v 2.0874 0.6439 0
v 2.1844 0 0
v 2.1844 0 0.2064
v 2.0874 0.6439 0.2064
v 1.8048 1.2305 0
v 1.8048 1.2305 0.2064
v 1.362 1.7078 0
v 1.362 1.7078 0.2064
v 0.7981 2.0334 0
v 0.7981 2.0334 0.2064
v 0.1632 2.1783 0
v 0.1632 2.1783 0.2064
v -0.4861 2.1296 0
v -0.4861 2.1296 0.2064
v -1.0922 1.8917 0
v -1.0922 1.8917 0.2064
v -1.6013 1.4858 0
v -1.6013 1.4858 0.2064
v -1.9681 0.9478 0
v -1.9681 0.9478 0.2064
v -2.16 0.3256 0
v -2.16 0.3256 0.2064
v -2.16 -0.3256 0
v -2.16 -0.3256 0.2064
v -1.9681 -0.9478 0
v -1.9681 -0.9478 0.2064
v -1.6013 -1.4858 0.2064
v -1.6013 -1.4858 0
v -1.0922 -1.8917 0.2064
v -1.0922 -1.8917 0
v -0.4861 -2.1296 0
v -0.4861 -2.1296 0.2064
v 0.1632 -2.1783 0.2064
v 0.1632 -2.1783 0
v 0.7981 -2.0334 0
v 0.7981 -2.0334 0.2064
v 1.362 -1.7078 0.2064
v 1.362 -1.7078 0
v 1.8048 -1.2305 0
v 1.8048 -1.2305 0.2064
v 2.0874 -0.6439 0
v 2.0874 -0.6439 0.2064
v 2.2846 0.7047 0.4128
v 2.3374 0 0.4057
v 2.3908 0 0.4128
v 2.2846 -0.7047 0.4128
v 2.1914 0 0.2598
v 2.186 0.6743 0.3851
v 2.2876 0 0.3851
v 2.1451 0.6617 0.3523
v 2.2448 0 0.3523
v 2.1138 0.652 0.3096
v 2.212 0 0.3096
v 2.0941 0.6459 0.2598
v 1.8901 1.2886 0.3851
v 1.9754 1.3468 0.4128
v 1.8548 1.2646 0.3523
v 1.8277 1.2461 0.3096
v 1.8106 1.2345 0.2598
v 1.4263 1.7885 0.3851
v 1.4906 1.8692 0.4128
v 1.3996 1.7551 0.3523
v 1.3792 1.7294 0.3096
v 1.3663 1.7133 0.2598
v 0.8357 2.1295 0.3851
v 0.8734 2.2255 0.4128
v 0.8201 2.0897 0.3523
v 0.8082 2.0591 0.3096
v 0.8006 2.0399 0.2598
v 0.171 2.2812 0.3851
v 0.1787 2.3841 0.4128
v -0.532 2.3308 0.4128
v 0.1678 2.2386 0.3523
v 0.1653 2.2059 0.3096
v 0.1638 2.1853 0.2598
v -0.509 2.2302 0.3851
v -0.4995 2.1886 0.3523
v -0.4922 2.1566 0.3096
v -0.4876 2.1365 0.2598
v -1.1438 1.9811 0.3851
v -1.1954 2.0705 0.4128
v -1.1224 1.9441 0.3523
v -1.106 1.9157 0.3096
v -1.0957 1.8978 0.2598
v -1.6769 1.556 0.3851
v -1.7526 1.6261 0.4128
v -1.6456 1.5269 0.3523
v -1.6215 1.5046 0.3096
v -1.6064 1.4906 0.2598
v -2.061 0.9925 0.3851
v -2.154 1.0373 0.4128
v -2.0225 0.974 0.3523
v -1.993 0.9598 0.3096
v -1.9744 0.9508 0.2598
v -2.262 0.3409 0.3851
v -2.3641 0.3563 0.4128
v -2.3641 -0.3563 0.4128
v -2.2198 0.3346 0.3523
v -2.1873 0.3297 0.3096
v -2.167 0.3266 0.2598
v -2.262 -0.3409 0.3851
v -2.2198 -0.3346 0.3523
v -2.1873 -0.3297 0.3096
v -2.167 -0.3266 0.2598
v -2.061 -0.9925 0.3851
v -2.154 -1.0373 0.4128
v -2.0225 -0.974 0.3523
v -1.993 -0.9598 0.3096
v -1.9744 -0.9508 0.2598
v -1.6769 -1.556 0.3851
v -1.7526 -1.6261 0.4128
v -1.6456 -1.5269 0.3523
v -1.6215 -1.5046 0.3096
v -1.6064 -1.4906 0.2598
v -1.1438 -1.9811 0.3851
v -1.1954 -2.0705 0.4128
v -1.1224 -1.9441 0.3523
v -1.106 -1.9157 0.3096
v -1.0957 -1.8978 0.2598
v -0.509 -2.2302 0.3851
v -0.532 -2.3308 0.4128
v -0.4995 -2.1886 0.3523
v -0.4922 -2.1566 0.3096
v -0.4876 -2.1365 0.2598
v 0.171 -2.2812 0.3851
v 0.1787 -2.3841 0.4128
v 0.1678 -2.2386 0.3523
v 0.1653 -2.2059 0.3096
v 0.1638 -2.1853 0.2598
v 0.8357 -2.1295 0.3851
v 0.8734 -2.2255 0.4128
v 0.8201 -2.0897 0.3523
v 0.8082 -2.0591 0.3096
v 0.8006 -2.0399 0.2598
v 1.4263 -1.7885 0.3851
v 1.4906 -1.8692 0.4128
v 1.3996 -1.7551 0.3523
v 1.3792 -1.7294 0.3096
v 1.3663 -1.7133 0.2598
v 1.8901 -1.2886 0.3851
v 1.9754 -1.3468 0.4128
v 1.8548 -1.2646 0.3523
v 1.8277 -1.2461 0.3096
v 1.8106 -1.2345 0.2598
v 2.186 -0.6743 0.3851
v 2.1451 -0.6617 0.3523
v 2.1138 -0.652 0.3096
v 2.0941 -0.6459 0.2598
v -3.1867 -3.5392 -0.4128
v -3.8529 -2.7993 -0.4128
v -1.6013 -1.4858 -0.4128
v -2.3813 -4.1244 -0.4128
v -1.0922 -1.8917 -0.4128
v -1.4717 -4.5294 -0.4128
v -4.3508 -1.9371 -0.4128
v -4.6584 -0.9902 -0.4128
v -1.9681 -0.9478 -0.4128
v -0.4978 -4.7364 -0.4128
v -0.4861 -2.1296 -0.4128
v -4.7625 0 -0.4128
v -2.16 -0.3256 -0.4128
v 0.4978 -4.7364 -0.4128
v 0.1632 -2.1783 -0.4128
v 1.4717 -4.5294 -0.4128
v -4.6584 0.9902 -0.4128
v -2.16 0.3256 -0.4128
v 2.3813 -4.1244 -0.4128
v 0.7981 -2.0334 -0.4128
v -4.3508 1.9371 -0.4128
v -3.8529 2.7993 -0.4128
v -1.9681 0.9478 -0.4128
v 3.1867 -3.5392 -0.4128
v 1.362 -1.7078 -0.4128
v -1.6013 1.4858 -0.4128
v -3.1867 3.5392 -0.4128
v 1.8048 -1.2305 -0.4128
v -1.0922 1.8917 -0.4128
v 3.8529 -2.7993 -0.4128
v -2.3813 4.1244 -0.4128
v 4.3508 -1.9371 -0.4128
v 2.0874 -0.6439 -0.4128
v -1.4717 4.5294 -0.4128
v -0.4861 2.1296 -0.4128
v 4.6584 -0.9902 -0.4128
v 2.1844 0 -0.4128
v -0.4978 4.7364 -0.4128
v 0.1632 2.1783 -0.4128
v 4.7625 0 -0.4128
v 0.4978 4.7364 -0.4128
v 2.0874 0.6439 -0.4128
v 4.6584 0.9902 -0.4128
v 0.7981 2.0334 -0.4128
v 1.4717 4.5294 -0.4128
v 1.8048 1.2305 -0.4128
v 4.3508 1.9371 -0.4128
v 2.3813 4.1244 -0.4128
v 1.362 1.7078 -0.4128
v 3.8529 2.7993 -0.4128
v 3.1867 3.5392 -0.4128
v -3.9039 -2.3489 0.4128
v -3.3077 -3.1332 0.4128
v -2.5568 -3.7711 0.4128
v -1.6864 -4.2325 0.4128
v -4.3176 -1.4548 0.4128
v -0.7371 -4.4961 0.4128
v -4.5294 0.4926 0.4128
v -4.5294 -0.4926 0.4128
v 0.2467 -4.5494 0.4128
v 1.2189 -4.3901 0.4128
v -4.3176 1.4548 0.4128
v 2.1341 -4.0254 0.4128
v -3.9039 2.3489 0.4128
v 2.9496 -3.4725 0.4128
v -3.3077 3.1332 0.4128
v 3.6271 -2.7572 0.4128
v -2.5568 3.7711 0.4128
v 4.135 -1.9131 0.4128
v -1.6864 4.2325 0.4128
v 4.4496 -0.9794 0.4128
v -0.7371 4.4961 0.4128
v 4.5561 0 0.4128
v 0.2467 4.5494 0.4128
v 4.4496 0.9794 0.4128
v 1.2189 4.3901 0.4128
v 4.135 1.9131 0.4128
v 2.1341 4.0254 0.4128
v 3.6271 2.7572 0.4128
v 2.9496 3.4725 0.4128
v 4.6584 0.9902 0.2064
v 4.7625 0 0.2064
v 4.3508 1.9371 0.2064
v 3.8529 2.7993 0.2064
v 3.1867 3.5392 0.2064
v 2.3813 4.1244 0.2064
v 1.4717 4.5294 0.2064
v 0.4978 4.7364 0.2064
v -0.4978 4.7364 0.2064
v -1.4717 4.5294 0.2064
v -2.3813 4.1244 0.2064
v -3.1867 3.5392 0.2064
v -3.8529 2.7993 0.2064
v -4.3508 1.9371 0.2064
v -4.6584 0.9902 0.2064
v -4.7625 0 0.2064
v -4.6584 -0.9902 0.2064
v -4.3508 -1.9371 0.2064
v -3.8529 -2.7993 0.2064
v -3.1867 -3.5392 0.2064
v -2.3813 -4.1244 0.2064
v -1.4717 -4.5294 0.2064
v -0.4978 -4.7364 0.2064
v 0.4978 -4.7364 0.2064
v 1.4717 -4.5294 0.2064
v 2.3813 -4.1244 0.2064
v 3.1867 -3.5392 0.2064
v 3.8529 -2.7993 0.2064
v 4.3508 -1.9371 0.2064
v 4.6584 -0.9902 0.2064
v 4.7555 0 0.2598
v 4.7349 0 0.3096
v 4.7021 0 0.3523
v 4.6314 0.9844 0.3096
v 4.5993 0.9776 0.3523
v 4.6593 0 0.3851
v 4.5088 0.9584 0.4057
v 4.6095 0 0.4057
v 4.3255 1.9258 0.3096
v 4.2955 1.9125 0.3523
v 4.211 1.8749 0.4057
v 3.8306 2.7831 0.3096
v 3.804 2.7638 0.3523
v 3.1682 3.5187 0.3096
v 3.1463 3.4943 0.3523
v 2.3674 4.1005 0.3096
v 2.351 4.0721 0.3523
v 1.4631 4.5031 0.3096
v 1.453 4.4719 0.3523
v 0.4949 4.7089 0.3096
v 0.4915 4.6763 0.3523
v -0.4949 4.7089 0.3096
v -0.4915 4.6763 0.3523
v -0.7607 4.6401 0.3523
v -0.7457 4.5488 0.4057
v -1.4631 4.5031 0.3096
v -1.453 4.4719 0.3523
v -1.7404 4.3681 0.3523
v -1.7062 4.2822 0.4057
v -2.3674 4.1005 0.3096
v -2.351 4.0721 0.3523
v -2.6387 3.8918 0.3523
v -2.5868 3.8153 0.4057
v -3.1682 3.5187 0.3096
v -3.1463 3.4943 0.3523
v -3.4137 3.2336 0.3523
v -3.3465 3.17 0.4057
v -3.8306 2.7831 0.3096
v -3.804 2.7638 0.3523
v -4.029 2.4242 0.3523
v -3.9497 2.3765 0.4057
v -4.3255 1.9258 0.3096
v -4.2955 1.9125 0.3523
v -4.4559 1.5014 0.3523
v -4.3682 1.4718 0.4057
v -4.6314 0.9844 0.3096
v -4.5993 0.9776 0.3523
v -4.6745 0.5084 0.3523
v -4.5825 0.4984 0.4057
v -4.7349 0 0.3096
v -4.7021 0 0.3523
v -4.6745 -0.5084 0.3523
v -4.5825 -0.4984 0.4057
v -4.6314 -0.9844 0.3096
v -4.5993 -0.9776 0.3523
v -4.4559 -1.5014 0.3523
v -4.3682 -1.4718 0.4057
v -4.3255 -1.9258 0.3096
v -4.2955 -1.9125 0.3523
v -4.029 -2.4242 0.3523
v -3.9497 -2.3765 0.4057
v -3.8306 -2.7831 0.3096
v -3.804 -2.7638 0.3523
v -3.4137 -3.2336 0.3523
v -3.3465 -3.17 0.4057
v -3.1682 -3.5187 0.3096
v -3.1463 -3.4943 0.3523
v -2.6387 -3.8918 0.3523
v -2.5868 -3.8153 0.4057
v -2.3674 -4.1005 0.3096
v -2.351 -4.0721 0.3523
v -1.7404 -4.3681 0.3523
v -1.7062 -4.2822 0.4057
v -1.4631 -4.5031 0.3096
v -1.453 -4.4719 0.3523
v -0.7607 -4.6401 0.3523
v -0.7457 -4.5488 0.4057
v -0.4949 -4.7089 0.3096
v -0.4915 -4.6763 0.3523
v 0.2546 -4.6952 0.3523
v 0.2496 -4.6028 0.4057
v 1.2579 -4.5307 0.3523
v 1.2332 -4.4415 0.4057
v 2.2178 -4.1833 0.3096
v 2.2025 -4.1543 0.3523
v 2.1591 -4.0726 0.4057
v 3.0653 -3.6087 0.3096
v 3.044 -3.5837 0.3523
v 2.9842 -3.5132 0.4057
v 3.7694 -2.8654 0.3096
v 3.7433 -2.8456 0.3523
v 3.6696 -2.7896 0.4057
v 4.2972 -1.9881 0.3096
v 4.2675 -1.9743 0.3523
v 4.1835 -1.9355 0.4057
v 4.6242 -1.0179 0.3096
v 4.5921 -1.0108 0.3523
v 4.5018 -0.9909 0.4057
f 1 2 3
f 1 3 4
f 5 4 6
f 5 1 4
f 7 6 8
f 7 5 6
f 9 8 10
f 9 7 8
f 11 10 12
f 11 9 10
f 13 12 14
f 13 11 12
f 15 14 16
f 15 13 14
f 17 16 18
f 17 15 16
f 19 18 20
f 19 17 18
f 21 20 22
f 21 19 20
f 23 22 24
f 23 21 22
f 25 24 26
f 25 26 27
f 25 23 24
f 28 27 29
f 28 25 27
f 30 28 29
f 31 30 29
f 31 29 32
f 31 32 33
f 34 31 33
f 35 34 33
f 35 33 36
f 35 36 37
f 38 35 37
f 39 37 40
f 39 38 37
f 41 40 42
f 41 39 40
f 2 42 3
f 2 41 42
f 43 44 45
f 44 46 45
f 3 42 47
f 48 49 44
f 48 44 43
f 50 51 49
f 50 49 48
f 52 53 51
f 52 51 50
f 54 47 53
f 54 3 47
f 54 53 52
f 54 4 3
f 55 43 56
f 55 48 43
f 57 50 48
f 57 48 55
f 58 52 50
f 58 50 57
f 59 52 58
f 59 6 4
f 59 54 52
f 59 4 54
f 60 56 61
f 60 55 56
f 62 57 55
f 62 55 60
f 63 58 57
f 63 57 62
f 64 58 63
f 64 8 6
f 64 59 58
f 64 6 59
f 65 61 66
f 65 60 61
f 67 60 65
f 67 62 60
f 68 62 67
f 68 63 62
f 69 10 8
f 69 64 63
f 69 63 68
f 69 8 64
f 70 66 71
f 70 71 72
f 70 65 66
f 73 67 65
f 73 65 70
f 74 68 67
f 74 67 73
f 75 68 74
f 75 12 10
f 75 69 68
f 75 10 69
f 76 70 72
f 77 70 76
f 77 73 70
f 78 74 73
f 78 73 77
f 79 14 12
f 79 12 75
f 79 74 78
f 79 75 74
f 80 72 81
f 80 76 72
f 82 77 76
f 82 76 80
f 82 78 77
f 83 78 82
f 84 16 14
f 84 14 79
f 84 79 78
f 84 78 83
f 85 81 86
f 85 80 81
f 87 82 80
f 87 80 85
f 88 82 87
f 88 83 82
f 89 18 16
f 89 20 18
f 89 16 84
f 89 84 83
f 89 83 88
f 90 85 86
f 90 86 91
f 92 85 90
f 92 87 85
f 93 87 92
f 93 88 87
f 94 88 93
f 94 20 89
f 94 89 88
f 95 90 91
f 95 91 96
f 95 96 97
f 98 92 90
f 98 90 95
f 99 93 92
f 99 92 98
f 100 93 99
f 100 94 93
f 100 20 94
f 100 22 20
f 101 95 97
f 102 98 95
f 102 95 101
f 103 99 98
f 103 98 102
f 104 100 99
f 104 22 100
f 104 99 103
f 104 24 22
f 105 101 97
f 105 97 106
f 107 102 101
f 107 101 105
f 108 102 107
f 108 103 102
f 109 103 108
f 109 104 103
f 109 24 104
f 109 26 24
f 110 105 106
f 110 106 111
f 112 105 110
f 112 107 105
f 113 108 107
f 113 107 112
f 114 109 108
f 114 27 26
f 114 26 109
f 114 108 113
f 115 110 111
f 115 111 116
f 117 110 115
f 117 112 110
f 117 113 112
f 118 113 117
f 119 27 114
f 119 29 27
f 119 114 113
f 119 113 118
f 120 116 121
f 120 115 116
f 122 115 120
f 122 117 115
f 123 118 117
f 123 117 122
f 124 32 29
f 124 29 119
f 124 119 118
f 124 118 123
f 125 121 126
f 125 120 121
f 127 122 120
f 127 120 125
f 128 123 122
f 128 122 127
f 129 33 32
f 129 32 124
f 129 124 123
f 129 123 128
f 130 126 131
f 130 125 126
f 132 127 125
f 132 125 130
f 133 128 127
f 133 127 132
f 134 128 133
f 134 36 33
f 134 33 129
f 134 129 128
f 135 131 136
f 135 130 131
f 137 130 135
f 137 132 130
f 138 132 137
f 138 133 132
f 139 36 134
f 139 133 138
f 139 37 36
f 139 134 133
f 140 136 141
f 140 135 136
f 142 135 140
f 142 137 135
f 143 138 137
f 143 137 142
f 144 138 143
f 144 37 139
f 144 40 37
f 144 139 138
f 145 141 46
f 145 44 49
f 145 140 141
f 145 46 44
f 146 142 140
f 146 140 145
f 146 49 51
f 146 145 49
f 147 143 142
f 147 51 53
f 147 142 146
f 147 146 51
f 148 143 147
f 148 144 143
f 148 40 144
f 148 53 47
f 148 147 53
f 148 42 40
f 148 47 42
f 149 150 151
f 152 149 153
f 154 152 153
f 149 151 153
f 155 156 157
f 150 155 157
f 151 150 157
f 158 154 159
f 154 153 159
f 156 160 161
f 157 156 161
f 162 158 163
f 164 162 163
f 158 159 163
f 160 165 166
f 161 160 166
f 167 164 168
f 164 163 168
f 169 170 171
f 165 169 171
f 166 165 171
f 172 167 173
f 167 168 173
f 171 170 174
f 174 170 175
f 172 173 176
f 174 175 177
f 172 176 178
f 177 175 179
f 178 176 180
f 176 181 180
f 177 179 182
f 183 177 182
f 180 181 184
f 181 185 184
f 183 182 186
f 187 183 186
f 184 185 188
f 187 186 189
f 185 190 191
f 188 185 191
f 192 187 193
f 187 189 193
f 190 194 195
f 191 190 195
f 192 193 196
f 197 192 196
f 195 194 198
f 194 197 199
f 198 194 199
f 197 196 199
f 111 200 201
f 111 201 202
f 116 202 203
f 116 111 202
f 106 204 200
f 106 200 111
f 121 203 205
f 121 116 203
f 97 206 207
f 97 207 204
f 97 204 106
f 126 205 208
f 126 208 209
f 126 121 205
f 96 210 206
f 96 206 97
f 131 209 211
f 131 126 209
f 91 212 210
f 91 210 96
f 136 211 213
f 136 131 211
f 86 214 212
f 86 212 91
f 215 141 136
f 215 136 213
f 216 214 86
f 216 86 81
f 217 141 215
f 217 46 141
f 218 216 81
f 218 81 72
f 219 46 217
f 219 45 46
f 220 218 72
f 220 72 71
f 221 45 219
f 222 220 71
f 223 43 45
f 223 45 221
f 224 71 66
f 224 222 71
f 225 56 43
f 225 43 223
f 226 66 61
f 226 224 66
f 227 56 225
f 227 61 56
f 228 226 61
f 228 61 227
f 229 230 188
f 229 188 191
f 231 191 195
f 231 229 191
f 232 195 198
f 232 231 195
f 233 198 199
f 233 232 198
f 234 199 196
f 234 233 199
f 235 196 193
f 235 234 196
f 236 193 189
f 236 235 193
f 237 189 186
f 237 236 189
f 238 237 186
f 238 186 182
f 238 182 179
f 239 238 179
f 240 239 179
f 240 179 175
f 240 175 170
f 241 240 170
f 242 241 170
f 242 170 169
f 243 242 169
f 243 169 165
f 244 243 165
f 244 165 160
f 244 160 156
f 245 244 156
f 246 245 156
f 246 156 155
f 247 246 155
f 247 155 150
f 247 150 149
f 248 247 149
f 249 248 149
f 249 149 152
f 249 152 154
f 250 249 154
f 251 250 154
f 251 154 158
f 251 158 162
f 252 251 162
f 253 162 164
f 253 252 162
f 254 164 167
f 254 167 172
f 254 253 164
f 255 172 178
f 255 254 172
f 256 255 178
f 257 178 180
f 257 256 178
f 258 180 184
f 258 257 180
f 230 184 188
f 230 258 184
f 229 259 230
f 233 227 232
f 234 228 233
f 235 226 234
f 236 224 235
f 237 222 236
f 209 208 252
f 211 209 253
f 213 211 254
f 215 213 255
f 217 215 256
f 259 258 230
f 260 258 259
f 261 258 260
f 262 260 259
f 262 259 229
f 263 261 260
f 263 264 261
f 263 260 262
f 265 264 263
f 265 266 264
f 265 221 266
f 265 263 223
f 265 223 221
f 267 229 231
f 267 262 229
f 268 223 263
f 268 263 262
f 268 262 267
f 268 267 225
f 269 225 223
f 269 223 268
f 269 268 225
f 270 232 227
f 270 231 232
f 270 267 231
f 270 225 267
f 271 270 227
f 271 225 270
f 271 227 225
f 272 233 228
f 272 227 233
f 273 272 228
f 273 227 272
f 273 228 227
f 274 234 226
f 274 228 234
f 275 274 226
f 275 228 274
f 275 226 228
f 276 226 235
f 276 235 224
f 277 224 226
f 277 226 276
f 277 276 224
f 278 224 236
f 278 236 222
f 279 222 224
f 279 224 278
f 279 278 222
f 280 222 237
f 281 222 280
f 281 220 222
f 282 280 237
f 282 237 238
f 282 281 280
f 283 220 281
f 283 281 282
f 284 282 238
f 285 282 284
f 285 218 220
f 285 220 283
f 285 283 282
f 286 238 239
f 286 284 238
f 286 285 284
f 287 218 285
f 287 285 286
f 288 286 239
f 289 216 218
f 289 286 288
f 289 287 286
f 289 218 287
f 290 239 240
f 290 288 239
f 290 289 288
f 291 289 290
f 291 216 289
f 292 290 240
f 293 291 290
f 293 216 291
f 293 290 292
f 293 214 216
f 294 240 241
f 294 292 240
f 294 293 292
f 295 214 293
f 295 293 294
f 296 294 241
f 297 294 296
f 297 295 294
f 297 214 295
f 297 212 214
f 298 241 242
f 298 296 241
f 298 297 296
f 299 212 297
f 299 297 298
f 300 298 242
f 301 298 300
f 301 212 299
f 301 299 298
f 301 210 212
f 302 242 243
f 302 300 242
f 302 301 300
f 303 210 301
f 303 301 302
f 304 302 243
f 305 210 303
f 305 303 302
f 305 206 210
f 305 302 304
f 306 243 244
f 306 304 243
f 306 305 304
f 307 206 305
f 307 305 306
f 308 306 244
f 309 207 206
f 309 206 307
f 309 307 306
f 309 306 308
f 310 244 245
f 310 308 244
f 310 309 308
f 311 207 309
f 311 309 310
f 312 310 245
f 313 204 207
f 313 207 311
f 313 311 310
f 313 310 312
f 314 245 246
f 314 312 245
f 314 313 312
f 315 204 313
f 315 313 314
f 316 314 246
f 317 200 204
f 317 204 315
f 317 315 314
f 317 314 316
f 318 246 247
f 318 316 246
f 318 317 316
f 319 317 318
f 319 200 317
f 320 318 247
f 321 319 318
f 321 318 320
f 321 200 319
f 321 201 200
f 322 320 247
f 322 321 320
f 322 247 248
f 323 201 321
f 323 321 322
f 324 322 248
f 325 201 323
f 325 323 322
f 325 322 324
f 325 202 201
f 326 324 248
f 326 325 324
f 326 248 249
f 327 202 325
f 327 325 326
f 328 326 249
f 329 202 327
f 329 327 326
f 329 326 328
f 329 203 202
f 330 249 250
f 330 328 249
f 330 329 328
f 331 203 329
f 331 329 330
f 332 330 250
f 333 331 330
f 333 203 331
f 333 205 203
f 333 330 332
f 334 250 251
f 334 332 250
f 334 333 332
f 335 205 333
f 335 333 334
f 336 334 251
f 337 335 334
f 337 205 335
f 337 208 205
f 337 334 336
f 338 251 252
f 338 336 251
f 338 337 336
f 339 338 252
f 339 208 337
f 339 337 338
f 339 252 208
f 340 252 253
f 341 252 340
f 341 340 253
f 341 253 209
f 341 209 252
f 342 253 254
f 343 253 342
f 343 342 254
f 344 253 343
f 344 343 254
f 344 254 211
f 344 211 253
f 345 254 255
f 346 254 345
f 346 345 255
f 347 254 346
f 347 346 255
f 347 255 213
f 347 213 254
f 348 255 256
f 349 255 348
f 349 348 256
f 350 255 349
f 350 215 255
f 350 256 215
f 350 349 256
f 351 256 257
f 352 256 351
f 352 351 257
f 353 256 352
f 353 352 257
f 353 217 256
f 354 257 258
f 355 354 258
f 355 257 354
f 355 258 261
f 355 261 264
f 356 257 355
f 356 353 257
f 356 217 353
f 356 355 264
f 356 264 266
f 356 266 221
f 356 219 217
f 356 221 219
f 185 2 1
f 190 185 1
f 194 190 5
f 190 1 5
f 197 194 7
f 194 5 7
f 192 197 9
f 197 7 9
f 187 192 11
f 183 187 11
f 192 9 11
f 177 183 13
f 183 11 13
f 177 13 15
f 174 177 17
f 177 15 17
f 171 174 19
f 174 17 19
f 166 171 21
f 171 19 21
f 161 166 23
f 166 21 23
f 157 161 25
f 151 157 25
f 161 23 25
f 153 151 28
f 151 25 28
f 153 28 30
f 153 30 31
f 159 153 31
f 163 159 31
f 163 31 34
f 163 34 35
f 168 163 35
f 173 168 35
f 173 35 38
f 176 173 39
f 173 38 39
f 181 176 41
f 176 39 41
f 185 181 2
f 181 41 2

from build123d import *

# Parameters (mm, degrees)
SKETCH3_R                = 4.7625
SKETCH3_R_2              = 2.1844
BOSS_EXTRUDE1_DEPTH      = 0.41275
BOSS_EXTRUDE1_DEPTH_BACK = 0.41275
FILLET1_R                = 0.206375


with BuildPart() as part:
    # Sketch3 → Boss-Extrude1 (new body, two sides)
    with BuildSketch(Plane.XY) as boss_extrude1_sk:
        Circle(SKETCH3_R)
        Circle(SKETCH3_R_2, mode=Mode.SUBTRACT)
    extrude(amount=BOSS_EXTRUDE1_DEPTH)
    extrude(boss_extrude1_sk.sketch, amount=-BOSS_EXTRUDE1_DEPTH_BACK)

    # Fillet1
    fillet1_edges = [part.edges().sort_by_distance(p)[0] for p in [
        (-4.7625, 0, 0.41275),
        (-2.1844, 0, 0.41275),
    ]]
    fillet(fillet1_edges, radius=FILLET1_R)


solid = part.part
